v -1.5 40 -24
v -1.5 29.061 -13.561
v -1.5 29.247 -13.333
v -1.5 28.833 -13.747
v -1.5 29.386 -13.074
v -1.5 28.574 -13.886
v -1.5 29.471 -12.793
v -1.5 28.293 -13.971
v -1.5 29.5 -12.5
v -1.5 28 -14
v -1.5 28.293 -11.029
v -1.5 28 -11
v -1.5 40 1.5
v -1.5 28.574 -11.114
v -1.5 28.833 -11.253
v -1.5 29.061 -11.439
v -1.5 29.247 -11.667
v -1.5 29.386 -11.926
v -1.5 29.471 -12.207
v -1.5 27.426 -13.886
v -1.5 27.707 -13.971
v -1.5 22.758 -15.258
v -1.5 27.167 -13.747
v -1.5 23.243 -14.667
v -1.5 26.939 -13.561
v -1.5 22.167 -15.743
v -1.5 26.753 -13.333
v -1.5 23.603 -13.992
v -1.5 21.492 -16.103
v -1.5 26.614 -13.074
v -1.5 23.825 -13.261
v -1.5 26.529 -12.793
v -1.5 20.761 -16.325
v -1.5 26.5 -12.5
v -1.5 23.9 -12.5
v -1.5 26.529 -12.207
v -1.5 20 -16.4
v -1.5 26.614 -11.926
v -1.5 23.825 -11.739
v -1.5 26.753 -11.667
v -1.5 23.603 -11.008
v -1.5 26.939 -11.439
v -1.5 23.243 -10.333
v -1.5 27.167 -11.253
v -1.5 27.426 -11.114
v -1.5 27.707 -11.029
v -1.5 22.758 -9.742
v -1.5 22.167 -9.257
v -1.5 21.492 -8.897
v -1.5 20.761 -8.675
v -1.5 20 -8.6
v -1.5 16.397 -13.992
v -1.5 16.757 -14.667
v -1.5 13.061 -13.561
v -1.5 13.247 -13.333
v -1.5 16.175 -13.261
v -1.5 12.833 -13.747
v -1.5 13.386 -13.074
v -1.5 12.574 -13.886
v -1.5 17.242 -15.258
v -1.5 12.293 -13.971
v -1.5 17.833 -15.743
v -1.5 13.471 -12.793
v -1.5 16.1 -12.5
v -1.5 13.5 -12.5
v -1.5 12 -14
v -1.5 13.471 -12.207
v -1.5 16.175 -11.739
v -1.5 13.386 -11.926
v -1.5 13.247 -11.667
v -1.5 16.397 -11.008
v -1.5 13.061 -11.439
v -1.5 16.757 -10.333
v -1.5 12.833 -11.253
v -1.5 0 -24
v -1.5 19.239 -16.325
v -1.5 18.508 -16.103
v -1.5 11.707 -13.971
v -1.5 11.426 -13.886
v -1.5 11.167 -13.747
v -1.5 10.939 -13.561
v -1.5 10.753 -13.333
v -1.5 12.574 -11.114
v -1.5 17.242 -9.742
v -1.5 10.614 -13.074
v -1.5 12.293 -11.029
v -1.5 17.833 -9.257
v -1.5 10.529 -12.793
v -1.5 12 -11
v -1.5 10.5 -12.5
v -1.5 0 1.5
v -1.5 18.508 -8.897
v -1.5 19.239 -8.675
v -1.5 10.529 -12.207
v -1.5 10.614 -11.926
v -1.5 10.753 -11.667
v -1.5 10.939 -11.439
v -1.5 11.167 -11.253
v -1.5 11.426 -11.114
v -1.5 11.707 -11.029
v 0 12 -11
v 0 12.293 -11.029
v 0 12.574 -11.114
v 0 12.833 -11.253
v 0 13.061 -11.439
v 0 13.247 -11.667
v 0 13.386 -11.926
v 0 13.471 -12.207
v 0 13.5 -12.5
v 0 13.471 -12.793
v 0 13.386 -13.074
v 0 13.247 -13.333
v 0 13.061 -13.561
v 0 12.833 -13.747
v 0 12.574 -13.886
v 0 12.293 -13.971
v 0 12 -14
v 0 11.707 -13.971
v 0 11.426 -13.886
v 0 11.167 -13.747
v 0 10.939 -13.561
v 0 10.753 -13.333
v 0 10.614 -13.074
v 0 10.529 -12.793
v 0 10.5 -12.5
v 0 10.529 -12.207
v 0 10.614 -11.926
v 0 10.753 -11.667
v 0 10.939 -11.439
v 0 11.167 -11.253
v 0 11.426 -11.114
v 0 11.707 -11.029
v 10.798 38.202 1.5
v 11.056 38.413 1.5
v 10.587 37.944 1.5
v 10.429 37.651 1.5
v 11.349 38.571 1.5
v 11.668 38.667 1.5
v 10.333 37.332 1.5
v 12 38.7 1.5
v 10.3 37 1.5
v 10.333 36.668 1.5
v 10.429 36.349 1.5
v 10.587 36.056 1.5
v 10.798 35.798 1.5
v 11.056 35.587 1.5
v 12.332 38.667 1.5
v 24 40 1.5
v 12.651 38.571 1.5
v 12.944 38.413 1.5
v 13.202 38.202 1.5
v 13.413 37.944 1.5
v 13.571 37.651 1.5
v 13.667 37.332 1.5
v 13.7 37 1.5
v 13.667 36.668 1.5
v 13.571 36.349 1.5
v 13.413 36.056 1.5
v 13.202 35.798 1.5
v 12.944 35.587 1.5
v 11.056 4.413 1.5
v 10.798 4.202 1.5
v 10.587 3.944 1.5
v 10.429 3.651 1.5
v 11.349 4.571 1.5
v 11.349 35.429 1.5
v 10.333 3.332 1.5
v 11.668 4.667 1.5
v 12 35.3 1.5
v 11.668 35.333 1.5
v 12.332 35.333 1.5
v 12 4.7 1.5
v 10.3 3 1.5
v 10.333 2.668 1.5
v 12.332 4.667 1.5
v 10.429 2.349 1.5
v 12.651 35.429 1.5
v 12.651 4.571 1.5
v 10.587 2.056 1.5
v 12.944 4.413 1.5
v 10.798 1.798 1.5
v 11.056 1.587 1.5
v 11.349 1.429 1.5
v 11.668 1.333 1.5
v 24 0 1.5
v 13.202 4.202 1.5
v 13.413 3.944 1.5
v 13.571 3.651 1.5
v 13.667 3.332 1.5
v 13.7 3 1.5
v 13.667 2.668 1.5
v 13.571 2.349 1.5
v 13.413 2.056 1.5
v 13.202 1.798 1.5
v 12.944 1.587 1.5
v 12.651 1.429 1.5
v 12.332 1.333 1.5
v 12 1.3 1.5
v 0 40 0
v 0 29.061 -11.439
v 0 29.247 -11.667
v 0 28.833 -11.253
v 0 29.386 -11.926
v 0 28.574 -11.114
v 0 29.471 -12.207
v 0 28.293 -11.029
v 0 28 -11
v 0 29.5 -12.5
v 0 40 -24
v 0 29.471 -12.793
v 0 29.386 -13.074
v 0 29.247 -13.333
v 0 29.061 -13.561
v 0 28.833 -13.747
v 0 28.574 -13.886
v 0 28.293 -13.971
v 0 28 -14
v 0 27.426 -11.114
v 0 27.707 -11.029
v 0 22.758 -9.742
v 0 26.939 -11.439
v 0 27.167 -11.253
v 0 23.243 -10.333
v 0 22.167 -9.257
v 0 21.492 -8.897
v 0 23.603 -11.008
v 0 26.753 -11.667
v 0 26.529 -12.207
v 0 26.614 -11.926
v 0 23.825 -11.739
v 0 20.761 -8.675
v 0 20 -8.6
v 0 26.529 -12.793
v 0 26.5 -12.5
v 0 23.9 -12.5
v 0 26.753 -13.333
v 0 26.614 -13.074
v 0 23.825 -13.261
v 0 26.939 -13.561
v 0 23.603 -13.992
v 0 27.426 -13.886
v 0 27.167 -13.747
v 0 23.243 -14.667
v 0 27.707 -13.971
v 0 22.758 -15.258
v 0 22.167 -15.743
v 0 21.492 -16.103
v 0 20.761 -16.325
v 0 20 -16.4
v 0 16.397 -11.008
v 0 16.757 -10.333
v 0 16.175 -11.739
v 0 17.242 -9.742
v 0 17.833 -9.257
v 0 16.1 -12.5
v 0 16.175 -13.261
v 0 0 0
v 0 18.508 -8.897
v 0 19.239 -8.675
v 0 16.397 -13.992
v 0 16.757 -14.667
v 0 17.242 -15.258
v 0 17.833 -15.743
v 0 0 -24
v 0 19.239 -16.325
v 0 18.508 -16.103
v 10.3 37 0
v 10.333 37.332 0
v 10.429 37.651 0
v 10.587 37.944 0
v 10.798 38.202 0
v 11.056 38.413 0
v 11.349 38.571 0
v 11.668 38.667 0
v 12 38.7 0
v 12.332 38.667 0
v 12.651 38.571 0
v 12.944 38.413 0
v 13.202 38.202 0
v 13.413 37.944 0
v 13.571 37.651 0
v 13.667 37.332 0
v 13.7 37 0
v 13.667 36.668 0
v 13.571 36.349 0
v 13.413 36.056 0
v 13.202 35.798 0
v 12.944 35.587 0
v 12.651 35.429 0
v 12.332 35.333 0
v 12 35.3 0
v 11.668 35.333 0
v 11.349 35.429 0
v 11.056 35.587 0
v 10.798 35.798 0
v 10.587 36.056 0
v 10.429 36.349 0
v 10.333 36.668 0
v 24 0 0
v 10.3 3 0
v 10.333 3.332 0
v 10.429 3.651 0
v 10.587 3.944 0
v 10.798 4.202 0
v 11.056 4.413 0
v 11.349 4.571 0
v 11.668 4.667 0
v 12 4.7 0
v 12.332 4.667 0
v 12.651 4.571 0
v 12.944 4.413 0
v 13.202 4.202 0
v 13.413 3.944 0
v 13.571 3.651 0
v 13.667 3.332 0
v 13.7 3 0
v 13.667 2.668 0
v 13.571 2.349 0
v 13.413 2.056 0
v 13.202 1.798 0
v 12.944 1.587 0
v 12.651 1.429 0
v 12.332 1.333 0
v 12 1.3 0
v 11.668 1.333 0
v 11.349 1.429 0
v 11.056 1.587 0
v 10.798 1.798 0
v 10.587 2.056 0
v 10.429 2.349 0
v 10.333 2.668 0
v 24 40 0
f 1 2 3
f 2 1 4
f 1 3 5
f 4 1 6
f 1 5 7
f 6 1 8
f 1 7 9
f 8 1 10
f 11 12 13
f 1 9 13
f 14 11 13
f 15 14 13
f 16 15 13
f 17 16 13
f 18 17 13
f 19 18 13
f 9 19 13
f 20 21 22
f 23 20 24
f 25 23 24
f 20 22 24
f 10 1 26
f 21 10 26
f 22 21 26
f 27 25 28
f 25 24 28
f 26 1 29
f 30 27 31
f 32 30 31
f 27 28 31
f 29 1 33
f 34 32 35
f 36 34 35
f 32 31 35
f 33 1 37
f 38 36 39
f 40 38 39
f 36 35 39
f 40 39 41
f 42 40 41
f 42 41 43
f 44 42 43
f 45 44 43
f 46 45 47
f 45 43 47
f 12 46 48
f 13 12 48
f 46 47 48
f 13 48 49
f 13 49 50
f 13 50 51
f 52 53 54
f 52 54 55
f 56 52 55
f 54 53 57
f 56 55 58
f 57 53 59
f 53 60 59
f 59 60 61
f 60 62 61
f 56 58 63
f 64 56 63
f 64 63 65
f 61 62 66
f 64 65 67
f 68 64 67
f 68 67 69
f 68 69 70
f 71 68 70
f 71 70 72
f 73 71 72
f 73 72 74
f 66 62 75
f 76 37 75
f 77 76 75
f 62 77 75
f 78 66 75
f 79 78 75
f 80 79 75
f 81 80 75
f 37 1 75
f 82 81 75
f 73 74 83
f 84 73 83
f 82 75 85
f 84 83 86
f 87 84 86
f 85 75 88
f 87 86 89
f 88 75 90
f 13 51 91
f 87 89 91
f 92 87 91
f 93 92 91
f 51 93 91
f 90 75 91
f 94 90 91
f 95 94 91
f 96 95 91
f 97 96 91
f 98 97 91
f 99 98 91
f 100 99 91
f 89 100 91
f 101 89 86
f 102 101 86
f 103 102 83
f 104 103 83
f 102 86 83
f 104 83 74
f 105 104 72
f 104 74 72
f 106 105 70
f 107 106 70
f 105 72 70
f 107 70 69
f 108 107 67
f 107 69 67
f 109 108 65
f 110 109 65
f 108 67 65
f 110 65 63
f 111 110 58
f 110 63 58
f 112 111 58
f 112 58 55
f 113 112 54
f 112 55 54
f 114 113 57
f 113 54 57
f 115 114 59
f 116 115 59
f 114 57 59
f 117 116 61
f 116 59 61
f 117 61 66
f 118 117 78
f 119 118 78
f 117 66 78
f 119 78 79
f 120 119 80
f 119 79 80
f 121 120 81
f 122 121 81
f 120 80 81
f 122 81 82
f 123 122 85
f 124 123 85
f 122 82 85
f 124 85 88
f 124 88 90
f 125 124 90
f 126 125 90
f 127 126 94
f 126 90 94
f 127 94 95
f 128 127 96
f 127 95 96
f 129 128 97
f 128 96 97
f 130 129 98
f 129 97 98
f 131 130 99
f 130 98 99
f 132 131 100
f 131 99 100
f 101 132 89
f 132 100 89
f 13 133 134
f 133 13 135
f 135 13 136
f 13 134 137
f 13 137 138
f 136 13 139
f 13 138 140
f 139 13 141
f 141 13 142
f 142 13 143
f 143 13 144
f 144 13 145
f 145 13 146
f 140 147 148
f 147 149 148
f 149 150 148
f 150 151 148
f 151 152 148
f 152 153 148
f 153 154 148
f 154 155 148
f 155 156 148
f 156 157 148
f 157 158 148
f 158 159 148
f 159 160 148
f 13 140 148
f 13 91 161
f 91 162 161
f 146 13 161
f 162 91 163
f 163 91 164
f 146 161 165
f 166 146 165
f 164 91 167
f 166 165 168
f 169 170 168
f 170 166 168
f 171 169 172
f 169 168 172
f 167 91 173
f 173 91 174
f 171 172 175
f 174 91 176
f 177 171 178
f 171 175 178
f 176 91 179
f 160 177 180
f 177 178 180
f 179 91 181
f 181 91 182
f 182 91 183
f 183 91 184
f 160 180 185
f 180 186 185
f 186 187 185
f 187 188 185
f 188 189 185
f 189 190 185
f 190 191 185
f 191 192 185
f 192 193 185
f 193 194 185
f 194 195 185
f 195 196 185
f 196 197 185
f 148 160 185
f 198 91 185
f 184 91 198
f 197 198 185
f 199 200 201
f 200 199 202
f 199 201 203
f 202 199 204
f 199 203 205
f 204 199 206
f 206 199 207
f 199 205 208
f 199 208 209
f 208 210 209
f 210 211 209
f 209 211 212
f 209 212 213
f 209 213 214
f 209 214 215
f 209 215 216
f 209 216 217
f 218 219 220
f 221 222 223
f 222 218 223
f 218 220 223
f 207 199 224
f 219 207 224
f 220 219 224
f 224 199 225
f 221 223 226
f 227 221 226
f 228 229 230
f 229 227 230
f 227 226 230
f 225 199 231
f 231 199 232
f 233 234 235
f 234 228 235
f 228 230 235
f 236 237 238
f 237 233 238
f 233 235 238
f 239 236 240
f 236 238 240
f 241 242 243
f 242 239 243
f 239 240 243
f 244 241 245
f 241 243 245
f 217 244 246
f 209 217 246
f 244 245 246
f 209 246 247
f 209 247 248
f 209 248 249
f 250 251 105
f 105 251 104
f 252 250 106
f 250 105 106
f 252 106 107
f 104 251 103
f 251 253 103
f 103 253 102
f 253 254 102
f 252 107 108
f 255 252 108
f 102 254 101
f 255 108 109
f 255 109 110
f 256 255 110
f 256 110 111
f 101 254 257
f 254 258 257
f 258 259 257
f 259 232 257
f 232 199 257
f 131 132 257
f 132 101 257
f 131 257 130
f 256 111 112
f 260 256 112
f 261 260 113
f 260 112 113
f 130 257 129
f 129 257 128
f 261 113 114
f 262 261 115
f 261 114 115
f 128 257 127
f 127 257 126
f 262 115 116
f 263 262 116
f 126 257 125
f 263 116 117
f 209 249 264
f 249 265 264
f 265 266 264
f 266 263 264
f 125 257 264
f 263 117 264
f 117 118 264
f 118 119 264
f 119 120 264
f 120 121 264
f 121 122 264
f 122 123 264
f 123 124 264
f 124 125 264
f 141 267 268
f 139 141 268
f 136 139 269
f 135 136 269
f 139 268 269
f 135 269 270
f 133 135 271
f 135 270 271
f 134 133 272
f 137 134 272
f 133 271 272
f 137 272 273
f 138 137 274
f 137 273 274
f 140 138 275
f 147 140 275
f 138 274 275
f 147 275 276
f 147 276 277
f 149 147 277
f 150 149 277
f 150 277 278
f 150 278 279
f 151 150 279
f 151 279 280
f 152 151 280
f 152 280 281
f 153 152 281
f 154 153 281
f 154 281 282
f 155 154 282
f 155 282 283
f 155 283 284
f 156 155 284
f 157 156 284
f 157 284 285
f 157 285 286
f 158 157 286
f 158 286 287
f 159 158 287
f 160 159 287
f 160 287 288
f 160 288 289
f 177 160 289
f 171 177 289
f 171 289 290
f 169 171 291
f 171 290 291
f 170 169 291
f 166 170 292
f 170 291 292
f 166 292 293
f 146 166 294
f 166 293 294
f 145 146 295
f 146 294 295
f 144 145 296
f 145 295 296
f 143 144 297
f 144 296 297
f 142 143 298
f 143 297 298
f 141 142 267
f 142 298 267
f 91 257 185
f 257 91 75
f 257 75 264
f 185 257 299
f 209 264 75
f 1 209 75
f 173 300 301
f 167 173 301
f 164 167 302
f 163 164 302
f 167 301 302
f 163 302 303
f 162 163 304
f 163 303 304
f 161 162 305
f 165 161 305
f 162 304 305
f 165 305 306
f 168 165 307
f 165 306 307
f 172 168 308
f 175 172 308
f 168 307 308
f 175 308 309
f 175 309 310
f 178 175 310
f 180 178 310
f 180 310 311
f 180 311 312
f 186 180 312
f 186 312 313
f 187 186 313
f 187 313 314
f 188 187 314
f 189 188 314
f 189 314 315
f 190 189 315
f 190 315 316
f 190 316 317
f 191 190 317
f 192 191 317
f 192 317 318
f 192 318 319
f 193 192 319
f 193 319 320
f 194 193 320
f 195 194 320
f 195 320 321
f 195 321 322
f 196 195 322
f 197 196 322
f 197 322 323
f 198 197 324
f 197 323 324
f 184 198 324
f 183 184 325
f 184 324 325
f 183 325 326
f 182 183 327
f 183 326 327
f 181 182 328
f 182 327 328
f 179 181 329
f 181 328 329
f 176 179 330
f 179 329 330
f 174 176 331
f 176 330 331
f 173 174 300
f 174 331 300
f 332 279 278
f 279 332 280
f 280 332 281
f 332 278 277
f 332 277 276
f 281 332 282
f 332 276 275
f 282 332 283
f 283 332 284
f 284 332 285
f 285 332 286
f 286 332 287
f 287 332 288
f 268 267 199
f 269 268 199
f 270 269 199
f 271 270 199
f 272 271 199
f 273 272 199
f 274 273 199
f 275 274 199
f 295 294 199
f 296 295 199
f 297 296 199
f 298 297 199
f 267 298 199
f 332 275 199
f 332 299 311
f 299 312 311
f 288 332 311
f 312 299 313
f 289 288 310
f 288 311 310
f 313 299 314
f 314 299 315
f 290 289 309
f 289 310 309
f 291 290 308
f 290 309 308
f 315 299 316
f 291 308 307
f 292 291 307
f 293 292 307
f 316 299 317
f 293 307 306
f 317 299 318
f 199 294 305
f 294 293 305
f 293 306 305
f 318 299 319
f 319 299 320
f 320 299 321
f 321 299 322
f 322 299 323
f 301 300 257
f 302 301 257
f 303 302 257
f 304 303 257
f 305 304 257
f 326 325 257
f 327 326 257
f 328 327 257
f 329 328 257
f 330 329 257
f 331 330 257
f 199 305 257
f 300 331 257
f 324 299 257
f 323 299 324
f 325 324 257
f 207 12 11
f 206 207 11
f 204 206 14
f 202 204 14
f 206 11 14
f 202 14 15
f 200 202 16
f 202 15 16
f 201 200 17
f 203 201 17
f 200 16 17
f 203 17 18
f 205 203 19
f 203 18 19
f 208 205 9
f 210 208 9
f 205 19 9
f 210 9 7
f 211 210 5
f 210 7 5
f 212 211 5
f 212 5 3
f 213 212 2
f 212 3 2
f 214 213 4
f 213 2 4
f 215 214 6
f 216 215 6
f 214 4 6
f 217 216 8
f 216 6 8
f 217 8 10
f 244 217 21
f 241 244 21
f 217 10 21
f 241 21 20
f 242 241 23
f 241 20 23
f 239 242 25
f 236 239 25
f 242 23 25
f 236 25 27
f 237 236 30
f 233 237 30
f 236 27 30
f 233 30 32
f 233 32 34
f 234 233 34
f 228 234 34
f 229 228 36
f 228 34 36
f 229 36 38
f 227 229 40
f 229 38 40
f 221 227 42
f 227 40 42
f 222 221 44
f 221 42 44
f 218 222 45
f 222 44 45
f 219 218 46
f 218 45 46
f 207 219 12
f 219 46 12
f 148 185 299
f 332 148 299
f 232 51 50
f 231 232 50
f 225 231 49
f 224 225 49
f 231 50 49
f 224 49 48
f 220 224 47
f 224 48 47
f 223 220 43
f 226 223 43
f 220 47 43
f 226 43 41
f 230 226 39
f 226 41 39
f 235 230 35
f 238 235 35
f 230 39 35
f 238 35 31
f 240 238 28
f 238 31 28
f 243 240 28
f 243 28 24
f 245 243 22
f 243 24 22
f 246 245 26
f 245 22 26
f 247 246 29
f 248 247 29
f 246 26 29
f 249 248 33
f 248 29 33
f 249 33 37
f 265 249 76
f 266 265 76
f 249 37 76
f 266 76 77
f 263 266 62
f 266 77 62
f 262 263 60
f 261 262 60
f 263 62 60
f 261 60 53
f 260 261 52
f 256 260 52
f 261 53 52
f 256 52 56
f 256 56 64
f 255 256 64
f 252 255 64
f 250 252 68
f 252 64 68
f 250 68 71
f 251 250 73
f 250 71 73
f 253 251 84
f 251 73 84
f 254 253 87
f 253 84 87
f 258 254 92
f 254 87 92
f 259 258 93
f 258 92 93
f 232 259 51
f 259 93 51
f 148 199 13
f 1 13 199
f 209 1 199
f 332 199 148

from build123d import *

# Parameters (mm, degrees)
BOSS_EXTRUDE1_DEPTH = 40
SKETCH3_R           = 3.9
SKETCH3_R_2         = 1.5
CUT_EXTRUDE1_DEPTH  = 1.5
SKETCH4_R           = 1.7
CUT_EXTRUDE2_DEPTH  = 10


with BuildPart() as part:
    # Sketch2 → Boss-Extrude1 (new body)
    with BuildSketch(Plane(origin=(0, 0, 0), x_dir=(1, 0, 0), z_dir=(0, 1, 0))):
        Polygon((0, 0), (0, 24), (-1.5, 24), (-1.5, -1.5), (24, -1.5), (24, 0), align=None)
    extrude(amount=BOSS_EXTRUDE1_DEPTH)

    # Sketch3 → Cut-Extrude1 (cut)
    with BuildSketch(Plane.ZY.offset(1.5)):
        with Locations((-12.5, 20)):
            Circle(SKETCH3_R)
        with Locations((-12.5, 28)):
            Circle(SKETCH3_R_2)
        with Locations((-12.5, 12)):
            Circle(SKETCH3_R_2)
    extrude(amount=-CUT_EXTRUDE1_DEPTH, mode=Mode.SUBTRACT)

    # Sketch4 → Cut-Extrude2 (cut)
    with BuildSketch(Plane(origin=(0, 0, 0), x_dir=(-1, 0, 0), z_dir=(0, 0, -1))):
        with Locations((-12, 3)):
            Circle(SKETCH4_R)
        with Locations((-12, 37)):
            Circle(SKETCH4_R)
    extrude(amount=-CUT_EXTRUDE2_DEPTH, mode=Mode.SUBTRACT)


solid = part.part
